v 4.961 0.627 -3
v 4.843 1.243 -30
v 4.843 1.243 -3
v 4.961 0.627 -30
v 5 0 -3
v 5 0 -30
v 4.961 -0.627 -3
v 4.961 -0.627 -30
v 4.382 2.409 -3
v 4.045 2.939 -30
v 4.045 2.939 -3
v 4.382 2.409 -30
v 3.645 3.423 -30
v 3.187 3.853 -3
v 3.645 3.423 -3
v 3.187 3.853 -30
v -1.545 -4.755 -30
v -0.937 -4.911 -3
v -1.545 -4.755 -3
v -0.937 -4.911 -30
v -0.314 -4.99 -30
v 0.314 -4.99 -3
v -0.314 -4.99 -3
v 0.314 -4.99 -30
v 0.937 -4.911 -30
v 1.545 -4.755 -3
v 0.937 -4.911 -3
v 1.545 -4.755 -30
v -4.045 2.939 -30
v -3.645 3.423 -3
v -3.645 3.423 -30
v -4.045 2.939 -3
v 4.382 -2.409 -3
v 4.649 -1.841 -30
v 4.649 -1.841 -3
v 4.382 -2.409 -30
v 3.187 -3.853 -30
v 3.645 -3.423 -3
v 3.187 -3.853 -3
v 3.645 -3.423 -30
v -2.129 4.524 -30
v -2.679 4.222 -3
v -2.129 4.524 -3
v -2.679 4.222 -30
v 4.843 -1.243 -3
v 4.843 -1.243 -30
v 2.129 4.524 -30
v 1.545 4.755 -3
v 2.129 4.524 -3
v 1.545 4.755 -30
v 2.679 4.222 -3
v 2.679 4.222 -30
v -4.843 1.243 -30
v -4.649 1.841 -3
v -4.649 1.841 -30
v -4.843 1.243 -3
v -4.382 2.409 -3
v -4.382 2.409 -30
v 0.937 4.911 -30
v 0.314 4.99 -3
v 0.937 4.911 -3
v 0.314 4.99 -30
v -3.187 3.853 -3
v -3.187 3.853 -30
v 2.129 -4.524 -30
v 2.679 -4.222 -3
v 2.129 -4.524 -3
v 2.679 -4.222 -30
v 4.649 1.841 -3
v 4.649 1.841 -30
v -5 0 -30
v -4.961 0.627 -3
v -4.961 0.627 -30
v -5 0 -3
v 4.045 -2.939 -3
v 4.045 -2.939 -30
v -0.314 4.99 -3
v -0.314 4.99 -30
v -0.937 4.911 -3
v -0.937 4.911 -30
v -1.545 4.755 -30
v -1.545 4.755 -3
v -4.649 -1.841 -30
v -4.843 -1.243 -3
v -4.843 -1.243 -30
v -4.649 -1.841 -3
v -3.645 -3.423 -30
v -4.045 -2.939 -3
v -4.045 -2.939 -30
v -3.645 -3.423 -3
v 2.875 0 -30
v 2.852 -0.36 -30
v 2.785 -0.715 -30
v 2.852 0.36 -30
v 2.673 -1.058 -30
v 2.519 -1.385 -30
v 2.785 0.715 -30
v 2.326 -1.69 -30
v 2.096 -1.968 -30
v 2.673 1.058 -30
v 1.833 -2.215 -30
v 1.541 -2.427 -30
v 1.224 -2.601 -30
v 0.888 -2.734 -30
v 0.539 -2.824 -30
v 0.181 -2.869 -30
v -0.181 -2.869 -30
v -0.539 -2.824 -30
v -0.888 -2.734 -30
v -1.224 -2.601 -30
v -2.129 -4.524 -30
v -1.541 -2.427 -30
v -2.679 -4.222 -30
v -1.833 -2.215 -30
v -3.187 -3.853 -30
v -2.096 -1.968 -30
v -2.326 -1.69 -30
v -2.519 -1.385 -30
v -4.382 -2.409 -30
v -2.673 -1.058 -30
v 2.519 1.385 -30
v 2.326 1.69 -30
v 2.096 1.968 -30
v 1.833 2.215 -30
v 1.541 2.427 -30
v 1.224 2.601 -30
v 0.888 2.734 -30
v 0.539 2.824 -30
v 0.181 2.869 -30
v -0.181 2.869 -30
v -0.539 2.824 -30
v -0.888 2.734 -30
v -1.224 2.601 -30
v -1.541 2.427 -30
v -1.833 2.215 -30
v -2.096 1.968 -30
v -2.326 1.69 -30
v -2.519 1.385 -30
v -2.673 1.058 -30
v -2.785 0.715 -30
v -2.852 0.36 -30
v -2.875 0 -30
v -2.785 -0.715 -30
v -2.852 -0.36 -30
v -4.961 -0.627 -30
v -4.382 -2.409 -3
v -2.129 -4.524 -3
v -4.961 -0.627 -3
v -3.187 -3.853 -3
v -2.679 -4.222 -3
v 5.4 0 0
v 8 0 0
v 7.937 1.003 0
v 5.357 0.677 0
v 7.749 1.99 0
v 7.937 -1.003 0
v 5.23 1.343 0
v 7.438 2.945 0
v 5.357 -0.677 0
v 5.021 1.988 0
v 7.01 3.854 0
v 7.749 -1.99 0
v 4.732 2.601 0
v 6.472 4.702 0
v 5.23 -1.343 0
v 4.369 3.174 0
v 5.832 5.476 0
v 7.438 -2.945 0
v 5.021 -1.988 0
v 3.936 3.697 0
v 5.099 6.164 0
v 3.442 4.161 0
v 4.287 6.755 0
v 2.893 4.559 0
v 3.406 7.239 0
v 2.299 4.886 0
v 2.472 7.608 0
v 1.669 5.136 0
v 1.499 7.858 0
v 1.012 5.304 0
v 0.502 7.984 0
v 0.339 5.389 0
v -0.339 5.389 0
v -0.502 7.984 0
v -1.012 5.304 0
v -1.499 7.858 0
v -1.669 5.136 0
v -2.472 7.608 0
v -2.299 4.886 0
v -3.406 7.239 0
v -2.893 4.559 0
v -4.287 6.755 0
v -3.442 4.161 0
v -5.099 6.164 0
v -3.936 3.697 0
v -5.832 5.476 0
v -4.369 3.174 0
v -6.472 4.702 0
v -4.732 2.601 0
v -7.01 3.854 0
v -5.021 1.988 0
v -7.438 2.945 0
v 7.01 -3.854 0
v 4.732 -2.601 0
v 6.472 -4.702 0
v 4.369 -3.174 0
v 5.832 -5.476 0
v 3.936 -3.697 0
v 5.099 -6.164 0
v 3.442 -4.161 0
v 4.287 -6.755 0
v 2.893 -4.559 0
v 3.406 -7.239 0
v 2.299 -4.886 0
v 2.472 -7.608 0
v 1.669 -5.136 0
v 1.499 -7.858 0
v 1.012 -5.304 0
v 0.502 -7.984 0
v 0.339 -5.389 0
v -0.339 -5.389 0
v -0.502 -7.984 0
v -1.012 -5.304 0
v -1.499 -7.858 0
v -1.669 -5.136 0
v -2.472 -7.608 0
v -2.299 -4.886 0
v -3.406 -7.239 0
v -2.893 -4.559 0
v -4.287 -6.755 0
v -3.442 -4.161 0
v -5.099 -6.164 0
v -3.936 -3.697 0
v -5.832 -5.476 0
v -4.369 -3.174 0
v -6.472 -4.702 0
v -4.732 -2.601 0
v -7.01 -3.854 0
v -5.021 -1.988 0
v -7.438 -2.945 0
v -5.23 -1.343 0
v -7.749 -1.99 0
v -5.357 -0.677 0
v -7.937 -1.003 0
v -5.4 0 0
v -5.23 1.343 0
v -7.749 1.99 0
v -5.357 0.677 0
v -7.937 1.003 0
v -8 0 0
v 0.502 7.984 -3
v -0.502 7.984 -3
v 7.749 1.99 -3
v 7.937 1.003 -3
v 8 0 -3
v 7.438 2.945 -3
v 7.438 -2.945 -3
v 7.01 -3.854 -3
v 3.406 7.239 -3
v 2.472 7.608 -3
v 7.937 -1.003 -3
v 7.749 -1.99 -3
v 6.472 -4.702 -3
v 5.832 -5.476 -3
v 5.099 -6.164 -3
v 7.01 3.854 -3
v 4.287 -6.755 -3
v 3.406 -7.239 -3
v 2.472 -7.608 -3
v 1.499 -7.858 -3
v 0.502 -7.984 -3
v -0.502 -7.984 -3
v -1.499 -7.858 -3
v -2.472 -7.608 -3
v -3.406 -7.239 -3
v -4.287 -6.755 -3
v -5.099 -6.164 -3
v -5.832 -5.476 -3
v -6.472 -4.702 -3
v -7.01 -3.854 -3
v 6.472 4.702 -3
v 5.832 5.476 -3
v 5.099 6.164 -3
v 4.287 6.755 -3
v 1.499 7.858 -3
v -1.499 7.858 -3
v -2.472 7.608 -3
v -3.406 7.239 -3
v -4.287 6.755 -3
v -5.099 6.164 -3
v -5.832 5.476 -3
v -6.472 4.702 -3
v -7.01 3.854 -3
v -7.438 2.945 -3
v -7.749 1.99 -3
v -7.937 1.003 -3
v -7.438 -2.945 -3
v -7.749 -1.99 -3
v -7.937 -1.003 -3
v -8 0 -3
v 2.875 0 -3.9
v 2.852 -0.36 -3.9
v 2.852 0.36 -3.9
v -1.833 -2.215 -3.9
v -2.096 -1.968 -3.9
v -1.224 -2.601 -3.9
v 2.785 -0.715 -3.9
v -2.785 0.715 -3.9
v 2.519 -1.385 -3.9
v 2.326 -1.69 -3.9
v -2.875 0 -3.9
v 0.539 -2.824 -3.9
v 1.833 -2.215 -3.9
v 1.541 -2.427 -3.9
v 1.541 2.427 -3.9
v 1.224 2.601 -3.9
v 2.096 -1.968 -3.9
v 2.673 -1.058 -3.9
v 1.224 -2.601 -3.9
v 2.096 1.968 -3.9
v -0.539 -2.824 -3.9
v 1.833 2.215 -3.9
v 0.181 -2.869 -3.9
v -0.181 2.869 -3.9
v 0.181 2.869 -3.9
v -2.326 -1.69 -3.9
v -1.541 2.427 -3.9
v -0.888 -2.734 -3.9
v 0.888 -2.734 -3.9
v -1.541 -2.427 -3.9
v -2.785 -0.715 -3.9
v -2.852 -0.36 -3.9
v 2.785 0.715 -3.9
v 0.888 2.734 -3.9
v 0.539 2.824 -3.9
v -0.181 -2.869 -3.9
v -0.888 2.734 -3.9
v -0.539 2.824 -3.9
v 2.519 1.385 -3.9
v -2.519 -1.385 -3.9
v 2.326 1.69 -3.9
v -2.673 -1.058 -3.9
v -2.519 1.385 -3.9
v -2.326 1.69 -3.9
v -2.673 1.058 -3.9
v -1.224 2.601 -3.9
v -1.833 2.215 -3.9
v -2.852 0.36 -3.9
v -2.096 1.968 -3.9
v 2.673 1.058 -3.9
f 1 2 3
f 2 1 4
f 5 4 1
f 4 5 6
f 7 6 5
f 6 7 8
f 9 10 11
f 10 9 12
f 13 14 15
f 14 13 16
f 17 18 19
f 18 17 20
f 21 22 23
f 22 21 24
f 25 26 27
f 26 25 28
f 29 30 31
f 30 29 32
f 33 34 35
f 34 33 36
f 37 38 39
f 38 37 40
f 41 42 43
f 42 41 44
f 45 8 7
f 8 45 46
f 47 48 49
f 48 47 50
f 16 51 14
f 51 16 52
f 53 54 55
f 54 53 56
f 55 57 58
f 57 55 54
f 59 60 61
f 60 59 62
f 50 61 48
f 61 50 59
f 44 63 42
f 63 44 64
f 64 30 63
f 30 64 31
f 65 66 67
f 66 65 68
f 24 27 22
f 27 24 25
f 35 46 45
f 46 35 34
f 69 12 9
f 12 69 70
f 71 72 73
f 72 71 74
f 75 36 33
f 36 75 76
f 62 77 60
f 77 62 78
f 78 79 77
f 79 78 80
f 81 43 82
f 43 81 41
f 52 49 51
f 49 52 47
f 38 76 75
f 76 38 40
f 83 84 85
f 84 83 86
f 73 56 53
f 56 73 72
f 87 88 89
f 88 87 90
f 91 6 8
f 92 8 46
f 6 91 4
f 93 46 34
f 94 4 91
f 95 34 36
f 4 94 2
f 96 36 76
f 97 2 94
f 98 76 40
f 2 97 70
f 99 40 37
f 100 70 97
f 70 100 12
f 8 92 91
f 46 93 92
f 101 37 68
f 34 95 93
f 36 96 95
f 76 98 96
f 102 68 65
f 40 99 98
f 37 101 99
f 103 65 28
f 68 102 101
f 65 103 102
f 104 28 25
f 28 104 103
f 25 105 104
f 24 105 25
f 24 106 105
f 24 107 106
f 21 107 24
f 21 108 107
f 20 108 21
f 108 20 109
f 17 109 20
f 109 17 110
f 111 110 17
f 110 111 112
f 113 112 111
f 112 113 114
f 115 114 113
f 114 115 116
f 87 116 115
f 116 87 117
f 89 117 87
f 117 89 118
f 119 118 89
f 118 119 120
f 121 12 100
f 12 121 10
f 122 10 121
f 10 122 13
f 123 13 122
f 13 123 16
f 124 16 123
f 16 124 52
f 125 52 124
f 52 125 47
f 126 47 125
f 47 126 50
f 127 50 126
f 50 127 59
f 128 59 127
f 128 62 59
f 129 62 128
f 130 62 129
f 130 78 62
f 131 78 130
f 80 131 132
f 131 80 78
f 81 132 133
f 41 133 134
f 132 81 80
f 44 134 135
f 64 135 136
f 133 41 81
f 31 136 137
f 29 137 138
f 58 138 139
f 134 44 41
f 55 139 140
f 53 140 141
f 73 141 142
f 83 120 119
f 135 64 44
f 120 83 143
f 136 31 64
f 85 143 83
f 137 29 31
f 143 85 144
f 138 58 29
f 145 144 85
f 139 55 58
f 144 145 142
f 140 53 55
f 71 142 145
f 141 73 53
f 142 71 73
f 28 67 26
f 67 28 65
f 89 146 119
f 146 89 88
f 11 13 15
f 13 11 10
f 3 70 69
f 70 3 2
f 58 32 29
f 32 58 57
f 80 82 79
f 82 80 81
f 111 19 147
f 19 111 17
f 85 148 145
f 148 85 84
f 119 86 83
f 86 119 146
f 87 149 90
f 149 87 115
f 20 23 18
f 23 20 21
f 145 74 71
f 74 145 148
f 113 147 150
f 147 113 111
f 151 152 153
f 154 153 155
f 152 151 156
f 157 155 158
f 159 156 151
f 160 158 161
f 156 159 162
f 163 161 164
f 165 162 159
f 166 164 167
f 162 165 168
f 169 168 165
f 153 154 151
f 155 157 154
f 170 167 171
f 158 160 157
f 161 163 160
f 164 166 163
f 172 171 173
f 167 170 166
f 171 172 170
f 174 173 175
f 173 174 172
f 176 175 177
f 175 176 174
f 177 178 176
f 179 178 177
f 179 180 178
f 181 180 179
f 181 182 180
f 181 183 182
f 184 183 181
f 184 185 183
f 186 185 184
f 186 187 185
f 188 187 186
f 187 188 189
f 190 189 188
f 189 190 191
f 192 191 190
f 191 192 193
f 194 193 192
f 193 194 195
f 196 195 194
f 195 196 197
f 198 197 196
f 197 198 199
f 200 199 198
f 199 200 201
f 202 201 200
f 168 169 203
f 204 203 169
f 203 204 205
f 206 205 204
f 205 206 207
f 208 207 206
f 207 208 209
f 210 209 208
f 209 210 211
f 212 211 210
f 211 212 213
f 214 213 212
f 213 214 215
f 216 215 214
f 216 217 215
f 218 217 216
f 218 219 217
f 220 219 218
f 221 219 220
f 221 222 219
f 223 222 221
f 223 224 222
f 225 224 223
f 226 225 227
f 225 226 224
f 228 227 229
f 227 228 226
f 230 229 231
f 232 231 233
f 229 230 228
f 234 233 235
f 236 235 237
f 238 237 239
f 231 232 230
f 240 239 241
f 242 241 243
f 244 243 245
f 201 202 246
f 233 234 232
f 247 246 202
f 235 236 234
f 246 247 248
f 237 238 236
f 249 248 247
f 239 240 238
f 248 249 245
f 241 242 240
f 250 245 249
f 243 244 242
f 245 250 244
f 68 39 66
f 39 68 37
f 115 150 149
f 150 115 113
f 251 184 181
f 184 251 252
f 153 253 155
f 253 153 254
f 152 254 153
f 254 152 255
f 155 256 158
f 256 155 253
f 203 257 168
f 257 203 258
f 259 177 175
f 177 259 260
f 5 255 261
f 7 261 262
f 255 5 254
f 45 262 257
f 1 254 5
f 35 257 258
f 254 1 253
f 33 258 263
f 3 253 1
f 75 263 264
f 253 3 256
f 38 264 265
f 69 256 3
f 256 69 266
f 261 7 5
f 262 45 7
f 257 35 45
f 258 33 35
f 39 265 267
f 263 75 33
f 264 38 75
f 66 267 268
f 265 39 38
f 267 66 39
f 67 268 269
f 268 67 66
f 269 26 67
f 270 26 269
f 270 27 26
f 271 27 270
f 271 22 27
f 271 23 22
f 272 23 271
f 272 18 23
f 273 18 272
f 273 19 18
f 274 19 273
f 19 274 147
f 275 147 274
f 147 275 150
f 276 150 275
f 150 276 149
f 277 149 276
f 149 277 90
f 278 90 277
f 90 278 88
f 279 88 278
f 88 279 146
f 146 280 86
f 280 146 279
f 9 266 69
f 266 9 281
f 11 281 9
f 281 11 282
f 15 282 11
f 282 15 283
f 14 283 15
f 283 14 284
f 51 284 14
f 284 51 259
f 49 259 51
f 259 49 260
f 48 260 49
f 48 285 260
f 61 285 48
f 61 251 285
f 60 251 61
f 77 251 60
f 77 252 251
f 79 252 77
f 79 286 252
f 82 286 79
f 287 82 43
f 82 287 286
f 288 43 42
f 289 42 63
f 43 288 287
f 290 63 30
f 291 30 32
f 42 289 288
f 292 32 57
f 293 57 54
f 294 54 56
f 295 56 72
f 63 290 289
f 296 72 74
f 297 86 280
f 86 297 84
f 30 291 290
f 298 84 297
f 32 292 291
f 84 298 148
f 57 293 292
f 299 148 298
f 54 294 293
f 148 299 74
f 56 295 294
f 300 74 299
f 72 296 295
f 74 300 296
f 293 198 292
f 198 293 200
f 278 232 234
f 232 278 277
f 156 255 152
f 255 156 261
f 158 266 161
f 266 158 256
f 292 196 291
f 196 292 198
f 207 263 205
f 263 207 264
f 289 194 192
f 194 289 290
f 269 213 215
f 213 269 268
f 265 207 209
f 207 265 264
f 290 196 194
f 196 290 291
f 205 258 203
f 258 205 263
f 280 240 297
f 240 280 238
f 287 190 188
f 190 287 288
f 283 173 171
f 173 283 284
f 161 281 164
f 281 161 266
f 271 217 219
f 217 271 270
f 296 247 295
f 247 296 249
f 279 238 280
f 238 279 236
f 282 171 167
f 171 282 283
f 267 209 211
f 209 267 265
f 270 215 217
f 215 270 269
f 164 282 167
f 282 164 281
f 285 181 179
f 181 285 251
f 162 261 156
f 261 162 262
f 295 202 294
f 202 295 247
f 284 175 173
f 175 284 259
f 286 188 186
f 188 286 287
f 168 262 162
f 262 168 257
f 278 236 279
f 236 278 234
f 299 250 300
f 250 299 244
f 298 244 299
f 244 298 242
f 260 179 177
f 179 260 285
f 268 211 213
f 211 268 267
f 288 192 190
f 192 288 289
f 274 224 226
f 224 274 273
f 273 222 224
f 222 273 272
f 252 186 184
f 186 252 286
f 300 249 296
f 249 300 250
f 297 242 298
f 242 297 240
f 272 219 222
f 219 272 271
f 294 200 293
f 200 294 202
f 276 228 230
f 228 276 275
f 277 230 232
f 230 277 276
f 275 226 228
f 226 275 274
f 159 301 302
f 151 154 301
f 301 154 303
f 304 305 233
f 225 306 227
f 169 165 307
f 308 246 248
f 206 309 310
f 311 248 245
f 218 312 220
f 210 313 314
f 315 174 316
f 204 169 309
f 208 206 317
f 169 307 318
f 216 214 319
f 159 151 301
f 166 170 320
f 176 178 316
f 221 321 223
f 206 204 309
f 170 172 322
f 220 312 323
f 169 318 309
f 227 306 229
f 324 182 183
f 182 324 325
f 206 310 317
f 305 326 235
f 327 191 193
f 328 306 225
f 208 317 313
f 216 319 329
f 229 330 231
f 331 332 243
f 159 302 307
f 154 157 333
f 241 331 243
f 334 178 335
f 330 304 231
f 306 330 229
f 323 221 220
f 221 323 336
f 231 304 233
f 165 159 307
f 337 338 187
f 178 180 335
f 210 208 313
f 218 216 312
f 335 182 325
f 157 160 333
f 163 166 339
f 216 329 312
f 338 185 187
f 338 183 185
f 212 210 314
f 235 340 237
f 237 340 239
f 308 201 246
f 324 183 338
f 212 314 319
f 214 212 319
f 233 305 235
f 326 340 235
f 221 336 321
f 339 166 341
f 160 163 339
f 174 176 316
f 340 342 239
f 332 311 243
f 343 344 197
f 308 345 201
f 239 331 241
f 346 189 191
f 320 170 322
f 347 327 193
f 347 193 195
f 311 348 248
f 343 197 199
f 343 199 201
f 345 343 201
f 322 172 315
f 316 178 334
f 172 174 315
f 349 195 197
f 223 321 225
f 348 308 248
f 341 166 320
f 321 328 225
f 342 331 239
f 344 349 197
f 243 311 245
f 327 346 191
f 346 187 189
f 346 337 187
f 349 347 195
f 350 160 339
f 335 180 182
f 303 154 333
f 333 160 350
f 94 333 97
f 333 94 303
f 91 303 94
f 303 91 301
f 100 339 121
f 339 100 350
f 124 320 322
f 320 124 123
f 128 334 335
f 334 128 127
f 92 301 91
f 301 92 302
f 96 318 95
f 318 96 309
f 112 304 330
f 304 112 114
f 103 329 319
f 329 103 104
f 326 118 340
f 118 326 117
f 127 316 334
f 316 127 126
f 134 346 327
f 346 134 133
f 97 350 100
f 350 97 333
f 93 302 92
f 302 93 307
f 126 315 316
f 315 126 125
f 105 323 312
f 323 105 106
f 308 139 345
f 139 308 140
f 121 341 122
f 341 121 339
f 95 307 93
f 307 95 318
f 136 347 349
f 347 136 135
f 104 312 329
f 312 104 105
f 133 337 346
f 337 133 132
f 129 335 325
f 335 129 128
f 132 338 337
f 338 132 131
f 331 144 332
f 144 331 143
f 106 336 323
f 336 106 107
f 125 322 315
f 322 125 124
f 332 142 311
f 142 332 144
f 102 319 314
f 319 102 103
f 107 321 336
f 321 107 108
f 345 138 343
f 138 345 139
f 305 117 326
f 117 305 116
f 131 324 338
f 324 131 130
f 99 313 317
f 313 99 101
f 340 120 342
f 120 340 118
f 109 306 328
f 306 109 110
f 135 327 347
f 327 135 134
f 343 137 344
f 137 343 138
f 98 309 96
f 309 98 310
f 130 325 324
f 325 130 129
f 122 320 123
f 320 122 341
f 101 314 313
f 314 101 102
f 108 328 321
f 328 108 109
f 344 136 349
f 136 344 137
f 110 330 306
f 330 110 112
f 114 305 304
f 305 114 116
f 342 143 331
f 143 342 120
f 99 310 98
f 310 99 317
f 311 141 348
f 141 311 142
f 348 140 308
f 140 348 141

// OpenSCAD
$fn = 50;


difference() {
	union() {
		translate(v = [0, 0, -30.0000000000]) {
			cylinder(h = 30, r = 5.0000000000);
		}
		translate(v = [0, 0, -3.0000000000]) {
			cylinder(h = 3, r = 8.0000000000);
		}
	}
	union() {
		translate(v = [0, 0, 0]) {
			rotate(a = [0, 0, 0]) {
				difference() {
					union() {
						#translate(v = [0, 0, -30.0000000000]) {
							cylinder(h = 30, r = 2.6000000000);
						}
						#translate(v = [0, 0, -3.9000000000]) {
							cylinder(h = 3.9000000000, r = 5.0000000000, r1 = 2.8750000000, r2 = 5.4000000000);
						}
						#translate(v = [0, 0, -30.0000000000]) {
							cylinder(h = 30, r = 2.8750000000);
						}
						#translate(v = [0, 0, -30.0000000000]) {
							cylinder(h = 30, r = 2.6000000000);
						}
					}
					union();
				}
			}
		}
	}
}
